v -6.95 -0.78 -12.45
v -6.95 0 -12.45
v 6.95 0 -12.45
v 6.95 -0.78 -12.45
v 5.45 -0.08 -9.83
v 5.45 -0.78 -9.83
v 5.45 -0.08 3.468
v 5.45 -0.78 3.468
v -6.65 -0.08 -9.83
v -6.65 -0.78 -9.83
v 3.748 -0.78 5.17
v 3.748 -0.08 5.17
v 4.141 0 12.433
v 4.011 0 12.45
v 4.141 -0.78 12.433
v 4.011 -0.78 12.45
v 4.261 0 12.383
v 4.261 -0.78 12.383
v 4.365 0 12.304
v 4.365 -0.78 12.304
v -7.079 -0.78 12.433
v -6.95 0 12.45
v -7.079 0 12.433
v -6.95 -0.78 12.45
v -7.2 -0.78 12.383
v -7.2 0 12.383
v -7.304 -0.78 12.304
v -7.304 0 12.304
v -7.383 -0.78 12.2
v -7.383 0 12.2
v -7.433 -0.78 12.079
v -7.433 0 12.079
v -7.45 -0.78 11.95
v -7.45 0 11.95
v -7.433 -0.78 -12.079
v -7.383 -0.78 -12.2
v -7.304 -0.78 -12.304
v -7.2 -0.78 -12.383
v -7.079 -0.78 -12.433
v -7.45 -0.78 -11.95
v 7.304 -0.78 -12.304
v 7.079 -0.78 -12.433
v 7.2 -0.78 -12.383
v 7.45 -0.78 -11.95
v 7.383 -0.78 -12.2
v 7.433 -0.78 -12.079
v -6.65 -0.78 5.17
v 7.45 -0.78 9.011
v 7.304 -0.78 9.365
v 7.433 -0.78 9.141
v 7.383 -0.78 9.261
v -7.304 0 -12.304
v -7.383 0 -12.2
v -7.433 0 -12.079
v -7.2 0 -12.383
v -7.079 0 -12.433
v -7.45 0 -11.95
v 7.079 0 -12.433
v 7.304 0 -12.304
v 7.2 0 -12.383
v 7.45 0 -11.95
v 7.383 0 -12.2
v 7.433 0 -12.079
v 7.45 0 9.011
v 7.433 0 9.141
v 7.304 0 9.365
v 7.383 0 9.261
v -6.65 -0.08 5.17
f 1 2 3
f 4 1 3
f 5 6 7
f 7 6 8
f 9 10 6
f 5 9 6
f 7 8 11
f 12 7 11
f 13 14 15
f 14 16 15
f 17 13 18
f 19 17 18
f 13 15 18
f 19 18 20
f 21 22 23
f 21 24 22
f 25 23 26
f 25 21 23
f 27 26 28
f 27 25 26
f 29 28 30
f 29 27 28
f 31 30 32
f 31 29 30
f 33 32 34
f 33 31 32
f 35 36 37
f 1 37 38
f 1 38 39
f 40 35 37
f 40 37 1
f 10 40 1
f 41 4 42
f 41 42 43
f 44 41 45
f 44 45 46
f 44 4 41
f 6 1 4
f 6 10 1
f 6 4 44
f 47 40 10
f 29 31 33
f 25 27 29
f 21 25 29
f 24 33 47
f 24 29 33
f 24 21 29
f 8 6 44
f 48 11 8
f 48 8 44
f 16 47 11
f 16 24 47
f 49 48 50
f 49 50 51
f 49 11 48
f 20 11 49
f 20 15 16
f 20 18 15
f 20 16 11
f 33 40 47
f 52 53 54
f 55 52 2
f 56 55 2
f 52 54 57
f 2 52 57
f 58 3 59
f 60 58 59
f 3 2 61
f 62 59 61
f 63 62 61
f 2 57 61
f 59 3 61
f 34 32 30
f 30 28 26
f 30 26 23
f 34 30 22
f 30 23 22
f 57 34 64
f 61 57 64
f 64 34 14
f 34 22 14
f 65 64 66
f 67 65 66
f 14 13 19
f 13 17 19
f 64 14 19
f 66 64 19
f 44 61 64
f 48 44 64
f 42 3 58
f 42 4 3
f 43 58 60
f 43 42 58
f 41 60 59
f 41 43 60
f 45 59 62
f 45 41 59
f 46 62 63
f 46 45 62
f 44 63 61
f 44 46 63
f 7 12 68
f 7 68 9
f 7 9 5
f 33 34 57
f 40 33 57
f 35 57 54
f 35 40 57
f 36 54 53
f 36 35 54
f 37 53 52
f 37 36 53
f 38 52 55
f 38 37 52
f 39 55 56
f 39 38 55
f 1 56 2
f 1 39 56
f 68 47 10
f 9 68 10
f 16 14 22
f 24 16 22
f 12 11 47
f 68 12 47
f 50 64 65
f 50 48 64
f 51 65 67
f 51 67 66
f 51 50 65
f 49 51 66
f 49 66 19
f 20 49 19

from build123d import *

# Parameters (mm, degrees)
F1_DEPTH = 0.78
F2_R     = 0.5
F4_DEPTH = 0.7


with BuildPart() as f1:
    # F0 (on Front) → F1 (new body)
    with BuildSketch(Plane.XZ):
        Polygon((4.2184664682, 12.45), (-7.45, 12.45), (-7.45, -12.45), (7.45, -12.45), (7.45, 9.2184664682), align=None)
    extrude(amount=F1_DEPTH)

    # F2
    f2_edges = [f1.edges().sort_by_distance(p)[0] for p in [
        (-7.45, -0.39, 12.45),
        (-7.45, -0.39, -12.45),
        (7.45, -0.39, -12.45),
        (7.45, -0.39, 9.218466),
        (4.218466, -0.39, 12.45),
    ]]
    fillet(f2_edges, radius=F2_R)

    # F3 (on face) → F4 (cut)
    with BuildSketch(Plane.XZ.offset(0.78)):
        Polygon((3.7478837054, 5.17), (-6.65, 5.17), (-6.65, -9.83), (5.45, -9.83), (5.45, 3.4678837054), align=None)
    extrude(amount=-F4_DEPTH, mode=Mode.SUBTRACT)


solid = f1.part
